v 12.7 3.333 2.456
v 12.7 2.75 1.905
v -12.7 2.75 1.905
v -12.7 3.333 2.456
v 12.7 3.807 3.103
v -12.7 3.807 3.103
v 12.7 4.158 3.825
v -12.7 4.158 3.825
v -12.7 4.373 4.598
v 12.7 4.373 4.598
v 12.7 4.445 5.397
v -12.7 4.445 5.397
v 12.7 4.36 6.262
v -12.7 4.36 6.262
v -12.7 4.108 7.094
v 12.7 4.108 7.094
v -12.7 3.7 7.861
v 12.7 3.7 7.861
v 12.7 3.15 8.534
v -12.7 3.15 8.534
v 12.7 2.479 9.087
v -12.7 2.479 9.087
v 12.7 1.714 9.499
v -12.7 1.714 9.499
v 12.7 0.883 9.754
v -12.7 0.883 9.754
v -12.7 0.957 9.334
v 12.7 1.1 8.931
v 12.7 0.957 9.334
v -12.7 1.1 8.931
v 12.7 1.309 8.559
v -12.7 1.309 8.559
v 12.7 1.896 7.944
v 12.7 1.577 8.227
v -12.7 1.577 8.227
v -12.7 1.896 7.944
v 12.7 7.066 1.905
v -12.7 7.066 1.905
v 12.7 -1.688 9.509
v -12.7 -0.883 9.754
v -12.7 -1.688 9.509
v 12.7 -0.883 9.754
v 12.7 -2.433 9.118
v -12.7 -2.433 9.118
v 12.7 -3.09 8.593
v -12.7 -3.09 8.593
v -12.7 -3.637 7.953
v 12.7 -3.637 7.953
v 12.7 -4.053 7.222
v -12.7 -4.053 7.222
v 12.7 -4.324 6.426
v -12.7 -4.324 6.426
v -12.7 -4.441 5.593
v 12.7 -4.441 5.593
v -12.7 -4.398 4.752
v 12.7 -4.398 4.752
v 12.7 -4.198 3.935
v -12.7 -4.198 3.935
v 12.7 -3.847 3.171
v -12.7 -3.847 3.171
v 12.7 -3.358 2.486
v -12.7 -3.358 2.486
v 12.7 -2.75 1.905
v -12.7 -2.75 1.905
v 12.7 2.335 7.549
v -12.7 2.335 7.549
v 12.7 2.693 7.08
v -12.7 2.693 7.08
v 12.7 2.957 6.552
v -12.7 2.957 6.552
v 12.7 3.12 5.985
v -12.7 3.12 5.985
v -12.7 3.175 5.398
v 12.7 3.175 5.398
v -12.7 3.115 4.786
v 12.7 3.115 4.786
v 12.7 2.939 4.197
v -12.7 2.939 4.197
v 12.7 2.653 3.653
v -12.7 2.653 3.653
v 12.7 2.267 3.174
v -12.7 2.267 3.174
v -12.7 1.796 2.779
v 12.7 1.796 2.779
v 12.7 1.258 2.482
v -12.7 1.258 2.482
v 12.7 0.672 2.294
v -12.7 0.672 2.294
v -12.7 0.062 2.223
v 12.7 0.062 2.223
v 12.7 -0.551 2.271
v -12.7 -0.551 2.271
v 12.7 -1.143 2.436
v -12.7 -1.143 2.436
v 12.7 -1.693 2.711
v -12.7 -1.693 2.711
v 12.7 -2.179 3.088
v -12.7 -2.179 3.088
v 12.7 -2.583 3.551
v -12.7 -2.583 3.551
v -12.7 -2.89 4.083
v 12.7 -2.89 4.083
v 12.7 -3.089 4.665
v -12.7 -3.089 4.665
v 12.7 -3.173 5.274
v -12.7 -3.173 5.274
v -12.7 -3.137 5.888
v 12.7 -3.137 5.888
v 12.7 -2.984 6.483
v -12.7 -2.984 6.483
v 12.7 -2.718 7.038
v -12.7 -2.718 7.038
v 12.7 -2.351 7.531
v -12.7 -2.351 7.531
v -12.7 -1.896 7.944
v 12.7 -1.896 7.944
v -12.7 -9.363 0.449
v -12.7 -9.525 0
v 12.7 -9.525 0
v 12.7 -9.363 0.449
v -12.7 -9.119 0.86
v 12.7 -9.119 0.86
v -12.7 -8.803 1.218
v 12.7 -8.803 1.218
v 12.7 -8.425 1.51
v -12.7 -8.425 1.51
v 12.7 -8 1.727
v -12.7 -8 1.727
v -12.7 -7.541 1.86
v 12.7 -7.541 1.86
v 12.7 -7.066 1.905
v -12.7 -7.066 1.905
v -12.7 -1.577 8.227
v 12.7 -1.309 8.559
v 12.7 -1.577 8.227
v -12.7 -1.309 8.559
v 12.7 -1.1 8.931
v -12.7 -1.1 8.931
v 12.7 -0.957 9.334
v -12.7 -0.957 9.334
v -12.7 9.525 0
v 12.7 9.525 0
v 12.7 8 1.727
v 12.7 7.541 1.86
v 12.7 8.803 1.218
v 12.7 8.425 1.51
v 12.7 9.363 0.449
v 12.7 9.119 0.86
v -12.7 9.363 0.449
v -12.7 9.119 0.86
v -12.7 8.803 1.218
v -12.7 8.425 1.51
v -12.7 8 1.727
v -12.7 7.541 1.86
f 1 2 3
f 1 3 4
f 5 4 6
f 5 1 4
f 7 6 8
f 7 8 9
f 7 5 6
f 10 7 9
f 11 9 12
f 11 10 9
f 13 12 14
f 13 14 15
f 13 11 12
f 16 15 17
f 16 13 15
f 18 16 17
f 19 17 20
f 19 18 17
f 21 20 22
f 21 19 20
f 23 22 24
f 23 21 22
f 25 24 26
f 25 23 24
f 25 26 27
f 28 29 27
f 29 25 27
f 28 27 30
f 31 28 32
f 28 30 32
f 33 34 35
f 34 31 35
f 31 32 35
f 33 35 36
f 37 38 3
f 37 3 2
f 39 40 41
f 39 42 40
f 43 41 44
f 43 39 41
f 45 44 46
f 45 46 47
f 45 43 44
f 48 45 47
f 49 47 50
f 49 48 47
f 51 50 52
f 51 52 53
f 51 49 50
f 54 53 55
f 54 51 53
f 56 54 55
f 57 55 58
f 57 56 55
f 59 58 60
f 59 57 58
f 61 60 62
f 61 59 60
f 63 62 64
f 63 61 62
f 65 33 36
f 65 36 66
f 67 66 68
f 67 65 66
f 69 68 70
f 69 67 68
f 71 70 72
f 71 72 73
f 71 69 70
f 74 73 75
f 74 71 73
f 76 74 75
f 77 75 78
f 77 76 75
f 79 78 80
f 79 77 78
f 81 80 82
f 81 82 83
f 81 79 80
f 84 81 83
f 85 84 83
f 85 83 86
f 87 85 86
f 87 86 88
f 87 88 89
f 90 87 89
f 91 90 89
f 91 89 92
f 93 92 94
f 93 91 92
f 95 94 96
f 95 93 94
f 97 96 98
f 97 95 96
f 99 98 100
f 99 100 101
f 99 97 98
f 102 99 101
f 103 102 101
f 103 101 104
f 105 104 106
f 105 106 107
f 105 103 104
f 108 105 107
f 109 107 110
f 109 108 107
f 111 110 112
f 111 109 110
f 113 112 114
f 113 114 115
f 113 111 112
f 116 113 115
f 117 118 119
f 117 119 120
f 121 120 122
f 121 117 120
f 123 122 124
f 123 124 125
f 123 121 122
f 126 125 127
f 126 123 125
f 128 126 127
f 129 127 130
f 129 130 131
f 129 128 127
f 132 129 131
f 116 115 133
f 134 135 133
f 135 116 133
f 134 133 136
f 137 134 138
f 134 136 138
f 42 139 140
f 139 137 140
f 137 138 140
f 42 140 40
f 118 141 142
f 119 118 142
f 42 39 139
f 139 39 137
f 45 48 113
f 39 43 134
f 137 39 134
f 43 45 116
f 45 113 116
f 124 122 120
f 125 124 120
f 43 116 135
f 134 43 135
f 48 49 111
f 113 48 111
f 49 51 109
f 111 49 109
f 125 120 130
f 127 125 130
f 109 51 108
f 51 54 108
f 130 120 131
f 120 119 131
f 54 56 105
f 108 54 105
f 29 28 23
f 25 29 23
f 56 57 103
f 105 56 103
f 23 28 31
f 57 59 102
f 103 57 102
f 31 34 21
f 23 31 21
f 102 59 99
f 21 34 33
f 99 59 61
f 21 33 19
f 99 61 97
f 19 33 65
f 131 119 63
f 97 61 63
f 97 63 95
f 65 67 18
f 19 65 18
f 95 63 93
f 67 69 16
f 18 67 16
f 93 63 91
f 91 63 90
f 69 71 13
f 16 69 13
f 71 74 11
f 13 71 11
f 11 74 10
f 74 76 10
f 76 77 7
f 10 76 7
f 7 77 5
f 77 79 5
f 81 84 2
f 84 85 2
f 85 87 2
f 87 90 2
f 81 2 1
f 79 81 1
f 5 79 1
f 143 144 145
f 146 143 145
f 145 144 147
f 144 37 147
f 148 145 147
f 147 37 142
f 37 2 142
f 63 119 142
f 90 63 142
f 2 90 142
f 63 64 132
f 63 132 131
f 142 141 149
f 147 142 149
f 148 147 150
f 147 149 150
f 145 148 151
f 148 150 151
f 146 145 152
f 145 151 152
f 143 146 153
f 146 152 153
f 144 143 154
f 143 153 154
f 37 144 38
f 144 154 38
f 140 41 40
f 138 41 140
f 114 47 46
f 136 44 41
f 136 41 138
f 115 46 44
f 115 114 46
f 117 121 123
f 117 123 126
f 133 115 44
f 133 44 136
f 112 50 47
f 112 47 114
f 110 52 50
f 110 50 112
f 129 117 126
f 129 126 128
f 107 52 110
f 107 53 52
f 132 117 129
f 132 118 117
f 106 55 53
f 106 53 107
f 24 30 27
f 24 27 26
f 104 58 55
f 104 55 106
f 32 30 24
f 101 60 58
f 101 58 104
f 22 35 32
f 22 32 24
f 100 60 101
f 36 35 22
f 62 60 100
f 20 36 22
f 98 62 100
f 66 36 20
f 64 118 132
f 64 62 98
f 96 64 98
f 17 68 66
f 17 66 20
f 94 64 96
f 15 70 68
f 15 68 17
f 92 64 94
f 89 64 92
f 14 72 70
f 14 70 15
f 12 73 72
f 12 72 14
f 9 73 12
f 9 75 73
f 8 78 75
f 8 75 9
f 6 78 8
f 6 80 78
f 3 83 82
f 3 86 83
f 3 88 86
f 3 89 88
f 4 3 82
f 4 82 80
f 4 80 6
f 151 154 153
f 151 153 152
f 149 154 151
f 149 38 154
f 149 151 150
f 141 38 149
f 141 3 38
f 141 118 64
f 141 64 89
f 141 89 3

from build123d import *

# Parameters (mm, degrees)
F0_W        = 25.4
F0_H        = 19.05
F1_DEPTH    = 1.905
F3_DEPTH    = 12.7
F4_T1_DEPTH = 37.6967221242
F4_T3_DEPTH = 31.9335157919


# Not quite as in the source:
# - a fillet or chamfer that OpenCascade refuses, or shapes differently, is made with other operations: its cross-section is extruded or revolved along the edge and cut away or added


with BuildPart() as f1:
    # F0 (on Top) → F1 (new body)
    with BuildSketch(Plane.XY):
        Rectangle(F0_W, F0_H)
    extrude(amount=F1_DEPTH)

    # F2 (on Right) → F3 (join, symmetric)
    with BuildSketch(Plane.YZ):
        with BuildLine():
            ThreePointArc((-0.8833862371, 9.7538348994), (-4.3244369874, 6.4257362287), (-2.749630657, 1.905))
            Line((-2.749630657, 1.905), (2.749630657, 1.905))
            ThreePointArc((2.749630657, 1.905), (3.9987581366, 3.4563770351), (4.445, 5.3975))
            ThreePointArc((4.445, 5.3975), (3.4412698836, 8.2109829994), (0.8833862371, 9.7538348994))
            Line((0.8833862371, 9.7538348994), (0.8833862371, 8.4471317411))
            ThreePointArc((0.8833862371, 8.4471317411), (2.5382450929, 7.3048376336), (3.175, 5.3975))
            ThreePointArc((3.175, 5.3975), (-1.9073376336, 2.8592549071), (-0.8833862371, 8.4471317411))
            Line((-0.8833862371, 8.4471317411), (-0.8833862371, 9.7538348994))
        make_face()
    extrude(amount=F3_DEPTH, both=True)

    # F4: fillet of radius 2.54 on 4 edges, made by hand

    # F4_s2 → F4_t1 (cut)
    with BuildSketch(Plane.YZ.offset(-18.8483610621)):
        with BuildLine():
            ThreePointArc((-9.525, 0), (-8.6210815618, 1.3730463142), (-7.0656555752, 1.905))
            Line((-7.0656555752, 1.905), (-9.525, 1.905))
            Line((-9.525, 1.905), (-9.525, 0))
        make_face()
        with BuildLine():
            ThreePointArc((9.525, 0), (8.6210815618, 1.3730463142), (7.0656555752, 1.905))
            Line((7.0656555752, 1.905), (9.525, 1.905))
            Line((9.525, 1.905), (9.525, 0))
        make_face()
    extrude(amount=F4_T1_DEPTH, mode=Mode.SUBTRACT)

    # F4_s4 → F4_t3 (cut)
    with BuildSketch(Plane.YZ.offset(-15.9667578959)):
        with BuildLine():
            ThreePointArc((0.8833862371, 9.7538348994), (1.1966765002, 8.7408723938), (1.8962102849, 7.9440685845))
            ThreePointArc((1.8962102849, 7.9440685845), (1.4123764871, 8.2410572192), (0.8833862371, 8.4471317411))
            Line((0.8833862371, 8.4471317411), (0.8833862371, 9.7538348994))
        make_face()
        with BuildLine():
            ThreePointArc((-1.8962102849, 7.9440685845), (-1.1966765002, 8.7408723938), (-0.8833862371, 9.7538348994))
            Line((-0.8833862371, 9.7538348994), (-0.8833862371, 8.4471317411))
            ThreePointArc((-0.8833862371, 8.4471317411), (-1.4123764871, 8.2410572192), (-1.8962102849, 7.9440685845))
        make_face()
    extrude(amount=F4_T3_DEPTH, mode=Mode.SUBTRACT)


solid = f1.part
